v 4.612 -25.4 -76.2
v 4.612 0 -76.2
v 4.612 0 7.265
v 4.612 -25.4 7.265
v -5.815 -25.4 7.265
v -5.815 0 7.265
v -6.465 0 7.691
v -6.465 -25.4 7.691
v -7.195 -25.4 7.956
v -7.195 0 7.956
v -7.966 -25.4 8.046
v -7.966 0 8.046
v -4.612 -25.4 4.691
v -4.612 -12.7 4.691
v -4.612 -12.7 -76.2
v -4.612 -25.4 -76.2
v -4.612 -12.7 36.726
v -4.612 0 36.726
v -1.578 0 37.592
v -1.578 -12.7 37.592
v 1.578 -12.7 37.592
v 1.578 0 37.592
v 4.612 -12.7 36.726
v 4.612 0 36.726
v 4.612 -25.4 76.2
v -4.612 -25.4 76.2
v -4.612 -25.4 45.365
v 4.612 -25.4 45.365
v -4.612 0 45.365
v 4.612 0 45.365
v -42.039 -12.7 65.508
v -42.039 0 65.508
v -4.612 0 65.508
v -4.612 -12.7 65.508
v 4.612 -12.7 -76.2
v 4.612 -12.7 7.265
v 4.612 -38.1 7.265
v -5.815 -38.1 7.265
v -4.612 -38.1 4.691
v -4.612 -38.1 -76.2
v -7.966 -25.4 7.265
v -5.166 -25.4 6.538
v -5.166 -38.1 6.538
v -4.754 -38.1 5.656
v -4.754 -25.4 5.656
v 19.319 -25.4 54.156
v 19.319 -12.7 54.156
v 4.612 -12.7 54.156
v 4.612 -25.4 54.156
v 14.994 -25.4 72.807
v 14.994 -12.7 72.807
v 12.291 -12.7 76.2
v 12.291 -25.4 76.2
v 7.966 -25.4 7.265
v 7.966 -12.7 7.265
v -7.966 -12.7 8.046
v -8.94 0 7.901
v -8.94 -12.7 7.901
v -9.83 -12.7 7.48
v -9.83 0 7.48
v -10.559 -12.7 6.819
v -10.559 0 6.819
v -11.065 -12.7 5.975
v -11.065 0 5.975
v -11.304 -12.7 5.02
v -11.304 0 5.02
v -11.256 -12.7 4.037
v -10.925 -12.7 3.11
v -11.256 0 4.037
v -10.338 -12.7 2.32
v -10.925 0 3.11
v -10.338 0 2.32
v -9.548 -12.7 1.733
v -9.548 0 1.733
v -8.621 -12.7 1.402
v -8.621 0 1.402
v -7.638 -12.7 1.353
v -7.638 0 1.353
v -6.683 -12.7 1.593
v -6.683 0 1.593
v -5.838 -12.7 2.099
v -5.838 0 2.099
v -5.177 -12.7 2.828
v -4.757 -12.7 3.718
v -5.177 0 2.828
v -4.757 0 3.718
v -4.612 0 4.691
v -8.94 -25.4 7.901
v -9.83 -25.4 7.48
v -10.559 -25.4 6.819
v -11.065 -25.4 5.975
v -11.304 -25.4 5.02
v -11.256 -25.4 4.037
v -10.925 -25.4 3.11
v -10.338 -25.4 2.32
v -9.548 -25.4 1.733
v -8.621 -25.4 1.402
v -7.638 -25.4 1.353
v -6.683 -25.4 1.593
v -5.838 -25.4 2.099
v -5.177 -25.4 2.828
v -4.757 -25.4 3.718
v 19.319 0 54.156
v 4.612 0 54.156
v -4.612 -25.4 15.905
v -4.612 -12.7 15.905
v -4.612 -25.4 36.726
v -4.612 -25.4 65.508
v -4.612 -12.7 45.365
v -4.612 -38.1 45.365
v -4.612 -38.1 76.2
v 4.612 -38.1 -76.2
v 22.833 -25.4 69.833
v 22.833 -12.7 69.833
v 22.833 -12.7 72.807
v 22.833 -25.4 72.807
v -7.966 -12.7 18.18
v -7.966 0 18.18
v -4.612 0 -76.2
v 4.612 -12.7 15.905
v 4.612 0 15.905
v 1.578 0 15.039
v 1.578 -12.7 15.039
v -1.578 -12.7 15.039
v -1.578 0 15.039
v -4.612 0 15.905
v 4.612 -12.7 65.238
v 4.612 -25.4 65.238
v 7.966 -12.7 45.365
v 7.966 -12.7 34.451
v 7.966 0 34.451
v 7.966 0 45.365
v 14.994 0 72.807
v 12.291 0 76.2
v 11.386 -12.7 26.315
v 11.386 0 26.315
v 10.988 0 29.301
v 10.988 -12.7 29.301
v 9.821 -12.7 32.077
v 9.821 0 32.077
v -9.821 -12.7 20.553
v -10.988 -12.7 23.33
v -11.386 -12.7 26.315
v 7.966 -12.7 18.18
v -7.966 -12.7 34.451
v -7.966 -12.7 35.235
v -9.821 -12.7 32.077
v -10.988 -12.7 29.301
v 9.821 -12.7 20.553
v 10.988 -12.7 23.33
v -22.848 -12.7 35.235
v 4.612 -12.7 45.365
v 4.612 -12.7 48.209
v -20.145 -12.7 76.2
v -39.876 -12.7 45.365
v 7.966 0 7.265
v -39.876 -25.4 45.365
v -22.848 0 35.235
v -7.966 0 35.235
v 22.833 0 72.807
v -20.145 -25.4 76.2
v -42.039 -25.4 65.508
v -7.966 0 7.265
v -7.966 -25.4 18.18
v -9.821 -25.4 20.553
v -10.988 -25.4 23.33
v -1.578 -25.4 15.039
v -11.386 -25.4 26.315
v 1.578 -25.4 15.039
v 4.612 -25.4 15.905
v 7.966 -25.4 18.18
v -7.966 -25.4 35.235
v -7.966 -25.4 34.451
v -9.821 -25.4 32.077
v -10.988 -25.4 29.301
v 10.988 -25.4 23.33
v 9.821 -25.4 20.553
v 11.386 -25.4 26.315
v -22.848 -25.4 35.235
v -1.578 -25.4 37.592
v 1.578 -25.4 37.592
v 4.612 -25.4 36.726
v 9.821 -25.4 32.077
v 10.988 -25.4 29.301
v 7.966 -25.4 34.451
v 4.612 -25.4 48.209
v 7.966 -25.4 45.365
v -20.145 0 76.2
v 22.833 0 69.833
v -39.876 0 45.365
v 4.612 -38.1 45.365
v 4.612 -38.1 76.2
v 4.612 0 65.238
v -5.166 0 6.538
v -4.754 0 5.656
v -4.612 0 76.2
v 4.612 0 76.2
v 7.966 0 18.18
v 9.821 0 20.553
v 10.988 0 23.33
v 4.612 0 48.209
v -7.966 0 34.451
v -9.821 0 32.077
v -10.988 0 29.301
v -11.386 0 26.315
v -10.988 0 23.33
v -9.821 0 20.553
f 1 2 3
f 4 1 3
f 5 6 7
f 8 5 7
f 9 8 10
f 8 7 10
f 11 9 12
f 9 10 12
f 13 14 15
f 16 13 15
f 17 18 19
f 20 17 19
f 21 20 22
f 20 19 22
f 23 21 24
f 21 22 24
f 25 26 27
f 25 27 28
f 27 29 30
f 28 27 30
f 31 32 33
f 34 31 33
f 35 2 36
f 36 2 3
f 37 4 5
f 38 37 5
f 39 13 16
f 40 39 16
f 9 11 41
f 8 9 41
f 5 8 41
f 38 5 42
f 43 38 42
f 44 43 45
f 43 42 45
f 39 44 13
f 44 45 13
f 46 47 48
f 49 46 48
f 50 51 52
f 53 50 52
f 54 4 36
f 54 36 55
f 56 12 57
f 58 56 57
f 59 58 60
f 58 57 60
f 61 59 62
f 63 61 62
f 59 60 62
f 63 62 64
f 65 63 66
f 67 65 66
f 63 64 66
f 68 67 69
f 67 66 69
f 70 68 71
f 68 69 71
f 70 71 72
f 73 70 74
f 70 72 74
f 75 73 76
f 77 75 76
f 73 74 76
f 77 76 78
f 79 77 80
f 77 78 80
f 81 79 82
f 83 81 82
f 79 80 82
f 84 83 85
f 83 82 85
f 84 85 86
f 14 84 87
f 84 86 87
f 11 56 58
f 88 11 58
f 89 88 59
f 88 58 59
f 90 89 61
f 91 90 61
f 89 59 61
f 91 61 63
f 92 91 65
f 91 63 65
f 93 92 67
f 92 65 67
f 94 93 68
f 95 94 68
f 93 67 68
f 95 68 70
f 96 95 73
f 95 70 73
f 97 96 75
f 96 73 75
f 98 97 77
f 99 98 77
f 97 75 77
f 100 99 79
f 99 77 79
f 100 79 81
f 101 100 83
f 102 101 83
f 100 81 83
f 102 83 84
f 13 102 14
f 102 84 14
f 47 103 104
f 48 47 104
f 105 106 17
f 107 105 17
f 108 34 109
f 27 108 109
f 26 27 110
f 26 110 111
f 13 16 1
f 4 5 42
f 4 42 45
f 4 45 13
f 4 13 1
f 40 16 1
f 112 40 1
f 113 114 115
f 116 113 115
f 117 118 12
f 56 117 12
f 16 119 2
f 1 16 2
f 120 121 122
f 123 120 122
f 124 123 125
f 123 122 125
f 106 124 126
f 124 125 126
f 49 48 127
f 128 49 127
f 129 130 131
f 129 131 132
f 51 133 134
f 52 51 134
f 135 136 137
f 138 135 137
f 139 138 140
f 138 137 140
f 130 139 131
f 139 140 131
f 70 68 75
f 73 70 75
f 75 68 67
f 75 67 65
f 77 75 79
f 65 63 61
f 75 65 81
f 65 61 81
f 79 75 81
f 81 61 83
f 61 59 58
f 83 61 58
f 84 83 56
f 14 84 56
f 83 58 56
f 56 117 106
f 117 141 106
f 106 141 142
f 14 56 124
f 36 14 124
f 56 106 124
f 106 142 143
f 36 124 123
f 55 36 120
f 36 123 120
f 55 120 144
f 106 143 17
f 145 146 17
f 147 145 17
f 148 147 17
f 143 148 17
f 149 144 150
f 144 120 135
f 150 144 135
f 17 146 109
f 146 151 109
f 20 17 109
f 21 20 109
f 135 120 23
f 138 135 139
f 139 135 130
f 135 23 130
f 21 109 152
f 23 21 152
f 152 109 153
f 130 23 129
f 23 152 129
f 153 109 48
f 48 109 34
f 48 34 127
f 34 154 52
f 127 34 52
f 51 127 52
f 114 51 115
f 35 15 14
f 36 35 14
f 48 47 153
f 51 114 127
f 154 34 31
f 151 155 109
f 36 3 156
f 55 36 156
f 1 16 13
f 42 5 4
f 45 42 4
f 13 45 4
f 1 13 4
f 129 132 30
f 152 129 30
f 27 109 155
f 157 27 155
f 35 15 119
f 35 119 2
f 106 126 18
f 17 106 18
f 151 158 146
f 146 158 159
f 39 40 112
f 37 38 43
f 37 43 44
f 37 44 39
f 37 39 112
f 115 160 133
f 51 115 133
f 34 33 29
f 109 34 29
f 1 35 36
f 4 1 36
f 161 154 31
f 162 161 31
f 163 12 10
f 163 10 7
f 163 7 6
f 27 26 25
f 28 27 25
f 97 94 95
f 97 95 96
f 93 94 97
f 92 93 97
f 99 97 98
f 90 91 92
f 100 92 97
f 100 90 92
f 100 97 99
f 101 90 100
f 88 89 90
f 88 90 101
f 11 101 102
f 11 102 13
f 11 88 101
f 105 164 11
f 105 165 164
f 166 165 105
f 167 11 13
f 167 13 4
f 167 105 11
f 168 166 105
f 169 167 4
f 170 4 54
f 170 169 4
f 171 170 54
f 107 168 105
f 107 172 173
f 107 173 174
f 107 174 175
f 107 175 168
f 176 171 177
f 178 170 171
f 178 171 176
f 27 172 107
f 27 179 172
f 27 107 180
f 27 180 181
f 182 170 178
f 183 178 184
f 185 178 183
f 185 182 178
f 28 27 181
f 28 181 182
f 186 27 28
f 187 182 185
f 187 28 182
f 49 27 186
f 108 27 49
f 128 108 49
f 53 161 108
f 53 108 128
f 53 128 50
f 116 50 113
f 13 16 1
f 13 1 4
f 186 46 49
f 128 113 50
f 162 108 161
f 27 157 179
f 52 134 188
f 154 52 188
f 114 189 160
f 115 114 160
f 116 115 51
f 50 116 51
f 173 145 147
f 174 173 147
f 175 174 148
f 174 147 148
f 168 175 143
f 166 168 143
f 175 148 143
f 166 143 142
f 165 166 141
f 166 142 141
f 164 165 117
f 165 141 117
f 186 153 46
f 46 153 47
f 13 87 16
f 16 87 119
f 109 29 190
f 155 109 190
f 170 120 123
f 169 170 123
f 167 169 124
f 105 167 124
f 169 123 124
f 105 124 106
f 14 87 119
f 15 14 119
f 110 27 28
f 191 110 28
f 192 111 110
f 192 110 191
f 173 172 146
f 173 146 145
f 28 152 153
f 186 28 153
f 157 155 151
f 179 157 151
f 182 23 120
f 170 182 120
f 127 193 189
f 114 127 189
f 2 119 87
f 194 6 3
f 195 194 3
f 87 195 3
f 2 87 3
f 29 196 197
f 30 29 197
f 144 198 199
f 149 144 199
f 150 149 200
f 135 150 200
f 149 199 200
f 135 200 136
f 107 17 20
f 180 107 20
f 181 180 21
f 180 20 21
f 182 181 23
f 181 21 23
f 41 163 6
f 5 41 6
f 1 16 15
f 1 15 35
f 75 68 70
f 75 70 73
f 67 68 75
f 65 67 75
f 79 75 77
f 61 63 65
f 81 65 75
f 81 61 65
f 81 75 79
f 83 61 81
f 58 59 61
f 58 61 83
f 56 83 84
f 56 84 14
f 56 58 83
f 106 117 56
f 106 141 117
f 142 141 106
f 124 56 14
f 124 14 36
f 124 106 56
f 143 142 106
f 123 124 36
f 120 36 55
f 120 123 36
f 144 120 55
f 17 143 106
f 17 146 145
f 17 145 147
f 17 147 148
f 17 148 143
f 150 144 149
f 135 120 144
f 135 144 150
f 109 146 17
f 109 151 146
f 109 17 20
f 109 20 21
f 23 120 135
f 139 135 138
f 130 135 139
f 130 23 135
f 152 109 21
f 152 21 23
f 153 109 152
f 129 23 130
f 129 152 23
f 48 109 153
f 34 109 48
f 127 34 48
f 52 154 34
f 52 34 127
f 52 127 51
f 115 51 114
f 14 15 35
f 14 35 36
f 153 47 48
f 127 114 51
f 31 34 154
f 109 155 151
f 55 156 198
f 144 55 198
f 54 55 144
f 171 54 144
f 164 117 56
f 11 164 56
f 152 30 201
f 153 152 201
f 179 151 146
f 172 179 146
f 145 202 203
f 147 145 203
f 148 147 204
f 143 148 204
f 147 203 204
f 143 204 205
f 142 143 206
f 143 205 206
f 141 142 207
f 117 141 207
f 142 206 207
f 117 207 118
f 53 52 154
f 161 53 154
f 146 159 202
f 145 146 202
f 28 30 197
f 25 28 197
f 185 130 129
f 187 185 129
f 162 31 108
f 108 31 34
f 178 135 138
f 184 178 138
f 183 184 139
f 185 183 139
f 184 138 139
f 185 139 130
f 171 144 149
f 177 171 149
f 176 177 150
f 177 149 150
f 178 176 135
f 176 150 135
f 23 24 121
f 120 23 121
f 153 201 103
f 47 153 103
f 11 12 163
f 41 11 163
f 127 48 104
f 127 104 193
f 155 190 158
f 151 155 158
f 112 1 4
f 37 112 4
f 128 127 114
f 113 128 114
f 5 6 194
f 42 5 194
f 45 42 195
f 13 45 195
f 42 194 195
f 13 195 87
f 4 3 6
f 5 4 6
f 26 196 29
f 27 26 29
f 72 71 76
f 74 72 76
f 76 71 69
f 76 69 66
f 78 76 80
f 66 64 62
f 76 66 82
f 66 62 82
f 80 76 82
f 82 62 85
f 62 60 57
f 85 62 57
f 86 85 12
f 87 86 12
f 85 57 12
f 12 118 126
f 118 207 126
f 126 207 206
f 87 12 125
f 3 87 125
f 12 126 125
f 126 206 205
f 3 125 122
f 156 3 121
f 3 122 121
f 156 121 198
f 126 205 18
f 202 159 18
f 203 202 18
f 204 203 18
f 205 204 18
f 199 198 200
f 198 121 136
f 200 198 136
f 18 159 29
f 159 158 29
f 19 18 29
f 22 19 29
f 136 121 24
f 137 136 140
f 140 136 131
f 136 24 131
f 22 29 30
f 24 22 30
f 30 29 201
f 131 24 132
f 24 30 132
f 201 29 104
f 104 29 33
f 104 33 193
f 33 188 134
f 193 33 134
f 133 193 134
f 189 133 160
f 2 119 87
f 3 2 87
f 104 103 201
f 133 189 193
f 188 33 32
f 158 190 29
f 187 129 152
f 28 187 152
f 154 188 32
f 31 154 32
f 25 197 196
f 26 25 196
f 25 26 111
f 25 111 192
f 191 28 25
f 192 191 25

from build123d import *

# Parameters (mm, degrees)
F1_DEPTH  = 25.4
F1_FACE_W = 9.2242108179
F1_FACE_H = 30.834726283
F2_DEPTH  = 12.7
F3_DEPTH  = 12.7


with BuildPart() as f1:
    # F0 (on Front) → F1 (new body)
    with BuildSketch(Plane.XZ):
        with BuildLine():
            Line((-7.9663358629, 7.265273717), (-5.8154628601, 7.265273717))
            ThreePointArc((-5.8154628601, 7.265273717), (-6.822299412, 7.8445429389), (-7.9663358629, 8.0456729287))
            Line((-7.9663358629, 8.0456729287), (-7.9663358629, 7.265273717))
        make_face()
    extrude(amount=F1_DEPTH)


with BuildPart() as f1b:
    # F0 (on Front) → F1, piece 2 (new body)
    with BuildSketch(Plane.XZ):
        with BuildLine():
            Line((-4.6121054089, 4.6914424747), (-4.6121054089, 7.265273717))
            Line((-4.6121054089, 7.265273717), (-5.8154628601, 7.265273717))
            ThreePointArc((-5.8154628601, 7.265273717), (-4.9278012106, 6.1120652624), (-4.6121054089, 4.6914424747))
        make_face()
        Polygon((4.6121054089, 7.265273717), (-4.6121054089, 7.265273717), (-4.6121054089, 4.6914424747), (-4.6121054089, -76.2), (4.6121054089, -76.2), align=None)
    extrude(amount=F1_DEPTH)


with BuildPart() as f1c:
    # F0 (on Front) → F1, piece 3 (new body)
    with BuildSketch(Plane.XZ):
        Polygon((4.6121054089, 65.2381628752), (4.6121054089, 76.2), (-4.6121054089, 76.2), (-4.6121054089, 65.5084699392), (-4.6121054089, 45.365273717), (4.6121054089, 45.365273717), (4.6121054089, 48.2094027102), (4.6121054089, 54.1559569538), align=None)
    extrude(amount=F1_DEPTH)


with BuildPart() as f2:
    # F0 (on Front) + F1_face (on face) → F2 (new body)
    with BuildSketch(Plane.XZ):
        Polygon((4.6121054089, 65.2381628752), (4.6121054089, 76.2), (-4.6121054089, 76.2), (-4.6121054089, 65.5084699392), (-4.6121054089, 45.365273717), (4.6121054089, 45.365273717), (4.6121054089, 48.2094027102), (4.6121054089, 54.1559569538), align=None)
        Polygon((12.2911036015, 76.2), (4.6121054089, 76.2), (4.6121054089, 65.2381628752), (22.8327196091, 69.8332339525), (22.8327196091, 72.8065147996), (17.9673600942, 72.8065147996), (14.9940820411, 72.8065147996), align=None)
        Polygon((-4.6121054089, 65.5084699392), (-4.6121054089, 76.2), (-20.144643262, 76.2), (-42.0387722552, 65.5084699392), align=None)
        Polygon((19.3188488483, 54.1559569538), (4.6121054089, 54.1559569538), (4.6121054089, 48.2094027102), align=None)
        with BuildLine():
            Line((4.6121054089, 45.365273717), (-4.6121054089, 45.365273717))
            Line((-4.6121054089, 45.365273717), (-4.6121054089, 36.7256611241))
            ThreePointArc((-4.6121054089, 36.7256611241), (0, 37.7015673313), (4.6121054089, 36.7256611241))
            Line((4.6121054089, 36.7256611241), (4.6121054089, 45.365273717))
        make_face()
        with BuildLine():
            Line((-4.6121054089, 36.7256611241), (-4.6121054089, 45.365273717))
            Line((-4.6121054089, 45.365273717), (-7.9663358629, 45.365273717))
            Line((-7.9663358629, 45.365273717), (-7.9663358629, 35.2351032197))
            Line((-7.9663358629, 35.2351032197), (-7.9663358629, 34.450700884))
            ThreePointArc((-7.9663358629, 34.450700884), (-6.3912563108, 35.7386237073), (-4.6121054089, 36.7256611241))
        make_face()
        with BuildLine():
            Line((-4.6121054089, 15.90488631), (-4.6121054089, 36.7256611241))
            ThreePointArc((-4.6121054089, 36.7256611241), (-6.3912563108, 35.7386237073), (-7.9663358629, 34.450700884))
            Line((-7.9663358629, 34.450700884), (-7.9663358629, 18.1798465501))
            ThreePointArc((-7.9663358629, 18.1798465501), (-6.3912563108, 16.8919237268), (-4.6121054089, 15.90488631))
        make_face()
        with BuildLine():
            Line((7.9663358629, 45.365273717), (4.6121054089, 45.365273717))
            Line((4.6121054089, 45.365273717), (4.6121054089, 36.7256611241))
            ThreePointArc((4.6121054089, 36.7256611241), (6.3912563108, 35.7386237073), (7.9663358629, 34.450700884))
            Line((7.9663358629, 34.450700884), (7.9663358629, 45.365273717))
        make_face()
        Polygon((-7.9663358629, 35.2351032197), (-7.9663358629, 45.365273717), (-39.8763902485, 45.365273717), (-22.847622633, 35.2351032197), align=None)
        with BuildLine():
            ThreePointArc((4.6121054089, 15.90488631), (0, 14.9289801028), (-4.6121054089, 15.90488631))
            Line((-4.6121054089, 15.90488631), (-4.6121054089, 7.265273717))
            Line((-4.6121054089, 7.265273717), (4.6121054089, 7.265273717))
            Line((4.6121054089, 7.265273717), (4.6121054089, 15.90488631))
        make_face()
        with BuildLine():
            Line((-4.6121054089, 7.265273717), (-4.6121054089, 15.90488631))
            ThreePointArc((-4.6121054089, 15.90488631), (-6.3912563108, 16.8919237268), (-7.9663358629, 18.1798465501))
            Line((-7.9663358629, 18.1798465501), (-7.9663358629, 8.0456729287))
            ThreePointArc((-7.9663358629, 8.0456729287), (-6.822299412, 7.8445429389), (-5.8154628601, 7.265273717))
            Line((-5.8154628601, 7.265273717), (-4.6121054089, 7.265273717))
        make_face()
        with BuildLine():
            ThreePointArc((7.9663358629, 34.450700884), (6.3912563108, 35.7386237073), (4.6121054089, 36.7256611241))
            Line((4.6121054089, 36.7256611241), (4.6121054089, 15.90488631))
            ThreePointArc((4.6121054089, 15.90488631), (6.3912563108, 16.8919237268), (7.9663358629, 18.1798465501))
            Line((7.9663358629, 18.1798465501), (7.9663358629, 34.450700884))
        make_face()
        with BuildLine():
            Line((-7.9663358629, 18.1798465501), (-7.9663358629, 34.450700884))
            ThreePointArc((-7.9663358629, 34.450700884), (-11.3862936142, 26.315273717), (-7.9663358629, 18.1798465501))
        make_face()
        Polygon((4.6121054089, 7.265273717), (-4.6121054089, 7.265273717), (-4.6121054089, 4.6914424747), (-4.6121054089, -76.2), (4.6121054089, -76.2), align=None)
        with BuildLine():
            Line((-4.6121054089, 4.6914424747), (-4.6121054089, 7.265273717))
            Line((-4.6121054089, 7.265273717), (-5.8154628601, 7.265273717))
            ThreePointArc((-5.8154628601, 7.265273717), (-4.9278012106, 6.1120652624), (-4.6121054089, 4.6914424747))
        make_face()
        with BuildLine():
            ThreePointArc((7.9663358629, 18.1798465501), (6.3912563108, 16.8919237268), (4.6121054089, 15.90488631))
            Line((4.6121054089, 15.90488631), (4.6121054089, 7.265273717))
            Line((4.6121054089, 7.265273717), (7.9663358629, 7.265273717))
            Line((7.9663358629, 7.265273717), (7.9663358629, 18.1798465501))
        make_face()
        with BuildLine():
            ThreePointArc((11.3862936142, 26.315273717), (10.4965404166, 30.7277924482), (7.9663358629, 34.450700884))
            Line((7.9663358629, 34.450700884), (7.9663358629, 18.1798465501))
            ThreePointArc((7.9663358629, 18.1798465501), (10.4965404166, 21.9027549859), (11.3862936142, 26.315273717))
        make_face()
        with BuildLine():
            ThreePointArc((-7.9663358629, 8.0456729287), (-10.3381349625, 2.3196433751), (-4.6121054089, 4.6914424747))
            ThreePointArc((-4.6121054089, 4.6914424747), (-4.9278012106, 6.1120652624), (-5.8154628601, 7.265273717))
            Line((-5.8154628601, 7.265273717), (-7.9663358629, 7.265273717))
            Line((-7.9663358629, 7.265273717), (-7.9663358629, 8.0456729287))
        make_face()
        with BuildLine():
            Line((-7.9663358629, 7.265273717), (-5.8154628601, 7.265273717))
            ThreePointArc((-5.8154628601, 7.265273717), (-6.822299412, 7.8445429389), (-7.9663358629, 8.0456729287))
            Line((-7.9663358629, 8.0456729287), (-7.9663358629, 7.265273717))
        make_face()
    with BuildSketch(Plane(origin=(-0.00607725, -25.4, -34.4169717723), x_dir=(1, 0, 0), z_dir=(0, -1, 0))):
        with BuildLine():
            ThreePointArc((-5.8093856101, 41.6822454894), (-4.9217239606, 40.5290370347), (-4.606028159, 39.1084142471))
            Line((-4.606028159, 39.1084142471), (-4.606028159, -41.7830282277))
            Line((-4.606028159, -41.7830282277), (4.6181826589, -41.7830282277))
            Line((4.6181826589, -41.7830282277), (4.6181826589, 41.6822454894))
            Line((4.6181826589, 41.6822454894), (-5.8093856101, 41.6822454894))
        make_face()
        with Locations((0.00607725, 95.1996086309)):
            Rectangle(F1_FACE_W, F1_FACE_H)
    extrude(amount=F2_DEPTH)


with BuildPart() as f3:
    # F3 (new): a face of the model
    f3_faces = [f2.part.faces().sort_by_distance(p)[0] for p in [
        (-6.3100125111, -12.7, 13.1127597394),
    ]]
    extrude(f3_faces, amount=F3_DEPTH)


solid = Compound([f1.part, f1b.part, f1c.part, f2.part, f3.part])
